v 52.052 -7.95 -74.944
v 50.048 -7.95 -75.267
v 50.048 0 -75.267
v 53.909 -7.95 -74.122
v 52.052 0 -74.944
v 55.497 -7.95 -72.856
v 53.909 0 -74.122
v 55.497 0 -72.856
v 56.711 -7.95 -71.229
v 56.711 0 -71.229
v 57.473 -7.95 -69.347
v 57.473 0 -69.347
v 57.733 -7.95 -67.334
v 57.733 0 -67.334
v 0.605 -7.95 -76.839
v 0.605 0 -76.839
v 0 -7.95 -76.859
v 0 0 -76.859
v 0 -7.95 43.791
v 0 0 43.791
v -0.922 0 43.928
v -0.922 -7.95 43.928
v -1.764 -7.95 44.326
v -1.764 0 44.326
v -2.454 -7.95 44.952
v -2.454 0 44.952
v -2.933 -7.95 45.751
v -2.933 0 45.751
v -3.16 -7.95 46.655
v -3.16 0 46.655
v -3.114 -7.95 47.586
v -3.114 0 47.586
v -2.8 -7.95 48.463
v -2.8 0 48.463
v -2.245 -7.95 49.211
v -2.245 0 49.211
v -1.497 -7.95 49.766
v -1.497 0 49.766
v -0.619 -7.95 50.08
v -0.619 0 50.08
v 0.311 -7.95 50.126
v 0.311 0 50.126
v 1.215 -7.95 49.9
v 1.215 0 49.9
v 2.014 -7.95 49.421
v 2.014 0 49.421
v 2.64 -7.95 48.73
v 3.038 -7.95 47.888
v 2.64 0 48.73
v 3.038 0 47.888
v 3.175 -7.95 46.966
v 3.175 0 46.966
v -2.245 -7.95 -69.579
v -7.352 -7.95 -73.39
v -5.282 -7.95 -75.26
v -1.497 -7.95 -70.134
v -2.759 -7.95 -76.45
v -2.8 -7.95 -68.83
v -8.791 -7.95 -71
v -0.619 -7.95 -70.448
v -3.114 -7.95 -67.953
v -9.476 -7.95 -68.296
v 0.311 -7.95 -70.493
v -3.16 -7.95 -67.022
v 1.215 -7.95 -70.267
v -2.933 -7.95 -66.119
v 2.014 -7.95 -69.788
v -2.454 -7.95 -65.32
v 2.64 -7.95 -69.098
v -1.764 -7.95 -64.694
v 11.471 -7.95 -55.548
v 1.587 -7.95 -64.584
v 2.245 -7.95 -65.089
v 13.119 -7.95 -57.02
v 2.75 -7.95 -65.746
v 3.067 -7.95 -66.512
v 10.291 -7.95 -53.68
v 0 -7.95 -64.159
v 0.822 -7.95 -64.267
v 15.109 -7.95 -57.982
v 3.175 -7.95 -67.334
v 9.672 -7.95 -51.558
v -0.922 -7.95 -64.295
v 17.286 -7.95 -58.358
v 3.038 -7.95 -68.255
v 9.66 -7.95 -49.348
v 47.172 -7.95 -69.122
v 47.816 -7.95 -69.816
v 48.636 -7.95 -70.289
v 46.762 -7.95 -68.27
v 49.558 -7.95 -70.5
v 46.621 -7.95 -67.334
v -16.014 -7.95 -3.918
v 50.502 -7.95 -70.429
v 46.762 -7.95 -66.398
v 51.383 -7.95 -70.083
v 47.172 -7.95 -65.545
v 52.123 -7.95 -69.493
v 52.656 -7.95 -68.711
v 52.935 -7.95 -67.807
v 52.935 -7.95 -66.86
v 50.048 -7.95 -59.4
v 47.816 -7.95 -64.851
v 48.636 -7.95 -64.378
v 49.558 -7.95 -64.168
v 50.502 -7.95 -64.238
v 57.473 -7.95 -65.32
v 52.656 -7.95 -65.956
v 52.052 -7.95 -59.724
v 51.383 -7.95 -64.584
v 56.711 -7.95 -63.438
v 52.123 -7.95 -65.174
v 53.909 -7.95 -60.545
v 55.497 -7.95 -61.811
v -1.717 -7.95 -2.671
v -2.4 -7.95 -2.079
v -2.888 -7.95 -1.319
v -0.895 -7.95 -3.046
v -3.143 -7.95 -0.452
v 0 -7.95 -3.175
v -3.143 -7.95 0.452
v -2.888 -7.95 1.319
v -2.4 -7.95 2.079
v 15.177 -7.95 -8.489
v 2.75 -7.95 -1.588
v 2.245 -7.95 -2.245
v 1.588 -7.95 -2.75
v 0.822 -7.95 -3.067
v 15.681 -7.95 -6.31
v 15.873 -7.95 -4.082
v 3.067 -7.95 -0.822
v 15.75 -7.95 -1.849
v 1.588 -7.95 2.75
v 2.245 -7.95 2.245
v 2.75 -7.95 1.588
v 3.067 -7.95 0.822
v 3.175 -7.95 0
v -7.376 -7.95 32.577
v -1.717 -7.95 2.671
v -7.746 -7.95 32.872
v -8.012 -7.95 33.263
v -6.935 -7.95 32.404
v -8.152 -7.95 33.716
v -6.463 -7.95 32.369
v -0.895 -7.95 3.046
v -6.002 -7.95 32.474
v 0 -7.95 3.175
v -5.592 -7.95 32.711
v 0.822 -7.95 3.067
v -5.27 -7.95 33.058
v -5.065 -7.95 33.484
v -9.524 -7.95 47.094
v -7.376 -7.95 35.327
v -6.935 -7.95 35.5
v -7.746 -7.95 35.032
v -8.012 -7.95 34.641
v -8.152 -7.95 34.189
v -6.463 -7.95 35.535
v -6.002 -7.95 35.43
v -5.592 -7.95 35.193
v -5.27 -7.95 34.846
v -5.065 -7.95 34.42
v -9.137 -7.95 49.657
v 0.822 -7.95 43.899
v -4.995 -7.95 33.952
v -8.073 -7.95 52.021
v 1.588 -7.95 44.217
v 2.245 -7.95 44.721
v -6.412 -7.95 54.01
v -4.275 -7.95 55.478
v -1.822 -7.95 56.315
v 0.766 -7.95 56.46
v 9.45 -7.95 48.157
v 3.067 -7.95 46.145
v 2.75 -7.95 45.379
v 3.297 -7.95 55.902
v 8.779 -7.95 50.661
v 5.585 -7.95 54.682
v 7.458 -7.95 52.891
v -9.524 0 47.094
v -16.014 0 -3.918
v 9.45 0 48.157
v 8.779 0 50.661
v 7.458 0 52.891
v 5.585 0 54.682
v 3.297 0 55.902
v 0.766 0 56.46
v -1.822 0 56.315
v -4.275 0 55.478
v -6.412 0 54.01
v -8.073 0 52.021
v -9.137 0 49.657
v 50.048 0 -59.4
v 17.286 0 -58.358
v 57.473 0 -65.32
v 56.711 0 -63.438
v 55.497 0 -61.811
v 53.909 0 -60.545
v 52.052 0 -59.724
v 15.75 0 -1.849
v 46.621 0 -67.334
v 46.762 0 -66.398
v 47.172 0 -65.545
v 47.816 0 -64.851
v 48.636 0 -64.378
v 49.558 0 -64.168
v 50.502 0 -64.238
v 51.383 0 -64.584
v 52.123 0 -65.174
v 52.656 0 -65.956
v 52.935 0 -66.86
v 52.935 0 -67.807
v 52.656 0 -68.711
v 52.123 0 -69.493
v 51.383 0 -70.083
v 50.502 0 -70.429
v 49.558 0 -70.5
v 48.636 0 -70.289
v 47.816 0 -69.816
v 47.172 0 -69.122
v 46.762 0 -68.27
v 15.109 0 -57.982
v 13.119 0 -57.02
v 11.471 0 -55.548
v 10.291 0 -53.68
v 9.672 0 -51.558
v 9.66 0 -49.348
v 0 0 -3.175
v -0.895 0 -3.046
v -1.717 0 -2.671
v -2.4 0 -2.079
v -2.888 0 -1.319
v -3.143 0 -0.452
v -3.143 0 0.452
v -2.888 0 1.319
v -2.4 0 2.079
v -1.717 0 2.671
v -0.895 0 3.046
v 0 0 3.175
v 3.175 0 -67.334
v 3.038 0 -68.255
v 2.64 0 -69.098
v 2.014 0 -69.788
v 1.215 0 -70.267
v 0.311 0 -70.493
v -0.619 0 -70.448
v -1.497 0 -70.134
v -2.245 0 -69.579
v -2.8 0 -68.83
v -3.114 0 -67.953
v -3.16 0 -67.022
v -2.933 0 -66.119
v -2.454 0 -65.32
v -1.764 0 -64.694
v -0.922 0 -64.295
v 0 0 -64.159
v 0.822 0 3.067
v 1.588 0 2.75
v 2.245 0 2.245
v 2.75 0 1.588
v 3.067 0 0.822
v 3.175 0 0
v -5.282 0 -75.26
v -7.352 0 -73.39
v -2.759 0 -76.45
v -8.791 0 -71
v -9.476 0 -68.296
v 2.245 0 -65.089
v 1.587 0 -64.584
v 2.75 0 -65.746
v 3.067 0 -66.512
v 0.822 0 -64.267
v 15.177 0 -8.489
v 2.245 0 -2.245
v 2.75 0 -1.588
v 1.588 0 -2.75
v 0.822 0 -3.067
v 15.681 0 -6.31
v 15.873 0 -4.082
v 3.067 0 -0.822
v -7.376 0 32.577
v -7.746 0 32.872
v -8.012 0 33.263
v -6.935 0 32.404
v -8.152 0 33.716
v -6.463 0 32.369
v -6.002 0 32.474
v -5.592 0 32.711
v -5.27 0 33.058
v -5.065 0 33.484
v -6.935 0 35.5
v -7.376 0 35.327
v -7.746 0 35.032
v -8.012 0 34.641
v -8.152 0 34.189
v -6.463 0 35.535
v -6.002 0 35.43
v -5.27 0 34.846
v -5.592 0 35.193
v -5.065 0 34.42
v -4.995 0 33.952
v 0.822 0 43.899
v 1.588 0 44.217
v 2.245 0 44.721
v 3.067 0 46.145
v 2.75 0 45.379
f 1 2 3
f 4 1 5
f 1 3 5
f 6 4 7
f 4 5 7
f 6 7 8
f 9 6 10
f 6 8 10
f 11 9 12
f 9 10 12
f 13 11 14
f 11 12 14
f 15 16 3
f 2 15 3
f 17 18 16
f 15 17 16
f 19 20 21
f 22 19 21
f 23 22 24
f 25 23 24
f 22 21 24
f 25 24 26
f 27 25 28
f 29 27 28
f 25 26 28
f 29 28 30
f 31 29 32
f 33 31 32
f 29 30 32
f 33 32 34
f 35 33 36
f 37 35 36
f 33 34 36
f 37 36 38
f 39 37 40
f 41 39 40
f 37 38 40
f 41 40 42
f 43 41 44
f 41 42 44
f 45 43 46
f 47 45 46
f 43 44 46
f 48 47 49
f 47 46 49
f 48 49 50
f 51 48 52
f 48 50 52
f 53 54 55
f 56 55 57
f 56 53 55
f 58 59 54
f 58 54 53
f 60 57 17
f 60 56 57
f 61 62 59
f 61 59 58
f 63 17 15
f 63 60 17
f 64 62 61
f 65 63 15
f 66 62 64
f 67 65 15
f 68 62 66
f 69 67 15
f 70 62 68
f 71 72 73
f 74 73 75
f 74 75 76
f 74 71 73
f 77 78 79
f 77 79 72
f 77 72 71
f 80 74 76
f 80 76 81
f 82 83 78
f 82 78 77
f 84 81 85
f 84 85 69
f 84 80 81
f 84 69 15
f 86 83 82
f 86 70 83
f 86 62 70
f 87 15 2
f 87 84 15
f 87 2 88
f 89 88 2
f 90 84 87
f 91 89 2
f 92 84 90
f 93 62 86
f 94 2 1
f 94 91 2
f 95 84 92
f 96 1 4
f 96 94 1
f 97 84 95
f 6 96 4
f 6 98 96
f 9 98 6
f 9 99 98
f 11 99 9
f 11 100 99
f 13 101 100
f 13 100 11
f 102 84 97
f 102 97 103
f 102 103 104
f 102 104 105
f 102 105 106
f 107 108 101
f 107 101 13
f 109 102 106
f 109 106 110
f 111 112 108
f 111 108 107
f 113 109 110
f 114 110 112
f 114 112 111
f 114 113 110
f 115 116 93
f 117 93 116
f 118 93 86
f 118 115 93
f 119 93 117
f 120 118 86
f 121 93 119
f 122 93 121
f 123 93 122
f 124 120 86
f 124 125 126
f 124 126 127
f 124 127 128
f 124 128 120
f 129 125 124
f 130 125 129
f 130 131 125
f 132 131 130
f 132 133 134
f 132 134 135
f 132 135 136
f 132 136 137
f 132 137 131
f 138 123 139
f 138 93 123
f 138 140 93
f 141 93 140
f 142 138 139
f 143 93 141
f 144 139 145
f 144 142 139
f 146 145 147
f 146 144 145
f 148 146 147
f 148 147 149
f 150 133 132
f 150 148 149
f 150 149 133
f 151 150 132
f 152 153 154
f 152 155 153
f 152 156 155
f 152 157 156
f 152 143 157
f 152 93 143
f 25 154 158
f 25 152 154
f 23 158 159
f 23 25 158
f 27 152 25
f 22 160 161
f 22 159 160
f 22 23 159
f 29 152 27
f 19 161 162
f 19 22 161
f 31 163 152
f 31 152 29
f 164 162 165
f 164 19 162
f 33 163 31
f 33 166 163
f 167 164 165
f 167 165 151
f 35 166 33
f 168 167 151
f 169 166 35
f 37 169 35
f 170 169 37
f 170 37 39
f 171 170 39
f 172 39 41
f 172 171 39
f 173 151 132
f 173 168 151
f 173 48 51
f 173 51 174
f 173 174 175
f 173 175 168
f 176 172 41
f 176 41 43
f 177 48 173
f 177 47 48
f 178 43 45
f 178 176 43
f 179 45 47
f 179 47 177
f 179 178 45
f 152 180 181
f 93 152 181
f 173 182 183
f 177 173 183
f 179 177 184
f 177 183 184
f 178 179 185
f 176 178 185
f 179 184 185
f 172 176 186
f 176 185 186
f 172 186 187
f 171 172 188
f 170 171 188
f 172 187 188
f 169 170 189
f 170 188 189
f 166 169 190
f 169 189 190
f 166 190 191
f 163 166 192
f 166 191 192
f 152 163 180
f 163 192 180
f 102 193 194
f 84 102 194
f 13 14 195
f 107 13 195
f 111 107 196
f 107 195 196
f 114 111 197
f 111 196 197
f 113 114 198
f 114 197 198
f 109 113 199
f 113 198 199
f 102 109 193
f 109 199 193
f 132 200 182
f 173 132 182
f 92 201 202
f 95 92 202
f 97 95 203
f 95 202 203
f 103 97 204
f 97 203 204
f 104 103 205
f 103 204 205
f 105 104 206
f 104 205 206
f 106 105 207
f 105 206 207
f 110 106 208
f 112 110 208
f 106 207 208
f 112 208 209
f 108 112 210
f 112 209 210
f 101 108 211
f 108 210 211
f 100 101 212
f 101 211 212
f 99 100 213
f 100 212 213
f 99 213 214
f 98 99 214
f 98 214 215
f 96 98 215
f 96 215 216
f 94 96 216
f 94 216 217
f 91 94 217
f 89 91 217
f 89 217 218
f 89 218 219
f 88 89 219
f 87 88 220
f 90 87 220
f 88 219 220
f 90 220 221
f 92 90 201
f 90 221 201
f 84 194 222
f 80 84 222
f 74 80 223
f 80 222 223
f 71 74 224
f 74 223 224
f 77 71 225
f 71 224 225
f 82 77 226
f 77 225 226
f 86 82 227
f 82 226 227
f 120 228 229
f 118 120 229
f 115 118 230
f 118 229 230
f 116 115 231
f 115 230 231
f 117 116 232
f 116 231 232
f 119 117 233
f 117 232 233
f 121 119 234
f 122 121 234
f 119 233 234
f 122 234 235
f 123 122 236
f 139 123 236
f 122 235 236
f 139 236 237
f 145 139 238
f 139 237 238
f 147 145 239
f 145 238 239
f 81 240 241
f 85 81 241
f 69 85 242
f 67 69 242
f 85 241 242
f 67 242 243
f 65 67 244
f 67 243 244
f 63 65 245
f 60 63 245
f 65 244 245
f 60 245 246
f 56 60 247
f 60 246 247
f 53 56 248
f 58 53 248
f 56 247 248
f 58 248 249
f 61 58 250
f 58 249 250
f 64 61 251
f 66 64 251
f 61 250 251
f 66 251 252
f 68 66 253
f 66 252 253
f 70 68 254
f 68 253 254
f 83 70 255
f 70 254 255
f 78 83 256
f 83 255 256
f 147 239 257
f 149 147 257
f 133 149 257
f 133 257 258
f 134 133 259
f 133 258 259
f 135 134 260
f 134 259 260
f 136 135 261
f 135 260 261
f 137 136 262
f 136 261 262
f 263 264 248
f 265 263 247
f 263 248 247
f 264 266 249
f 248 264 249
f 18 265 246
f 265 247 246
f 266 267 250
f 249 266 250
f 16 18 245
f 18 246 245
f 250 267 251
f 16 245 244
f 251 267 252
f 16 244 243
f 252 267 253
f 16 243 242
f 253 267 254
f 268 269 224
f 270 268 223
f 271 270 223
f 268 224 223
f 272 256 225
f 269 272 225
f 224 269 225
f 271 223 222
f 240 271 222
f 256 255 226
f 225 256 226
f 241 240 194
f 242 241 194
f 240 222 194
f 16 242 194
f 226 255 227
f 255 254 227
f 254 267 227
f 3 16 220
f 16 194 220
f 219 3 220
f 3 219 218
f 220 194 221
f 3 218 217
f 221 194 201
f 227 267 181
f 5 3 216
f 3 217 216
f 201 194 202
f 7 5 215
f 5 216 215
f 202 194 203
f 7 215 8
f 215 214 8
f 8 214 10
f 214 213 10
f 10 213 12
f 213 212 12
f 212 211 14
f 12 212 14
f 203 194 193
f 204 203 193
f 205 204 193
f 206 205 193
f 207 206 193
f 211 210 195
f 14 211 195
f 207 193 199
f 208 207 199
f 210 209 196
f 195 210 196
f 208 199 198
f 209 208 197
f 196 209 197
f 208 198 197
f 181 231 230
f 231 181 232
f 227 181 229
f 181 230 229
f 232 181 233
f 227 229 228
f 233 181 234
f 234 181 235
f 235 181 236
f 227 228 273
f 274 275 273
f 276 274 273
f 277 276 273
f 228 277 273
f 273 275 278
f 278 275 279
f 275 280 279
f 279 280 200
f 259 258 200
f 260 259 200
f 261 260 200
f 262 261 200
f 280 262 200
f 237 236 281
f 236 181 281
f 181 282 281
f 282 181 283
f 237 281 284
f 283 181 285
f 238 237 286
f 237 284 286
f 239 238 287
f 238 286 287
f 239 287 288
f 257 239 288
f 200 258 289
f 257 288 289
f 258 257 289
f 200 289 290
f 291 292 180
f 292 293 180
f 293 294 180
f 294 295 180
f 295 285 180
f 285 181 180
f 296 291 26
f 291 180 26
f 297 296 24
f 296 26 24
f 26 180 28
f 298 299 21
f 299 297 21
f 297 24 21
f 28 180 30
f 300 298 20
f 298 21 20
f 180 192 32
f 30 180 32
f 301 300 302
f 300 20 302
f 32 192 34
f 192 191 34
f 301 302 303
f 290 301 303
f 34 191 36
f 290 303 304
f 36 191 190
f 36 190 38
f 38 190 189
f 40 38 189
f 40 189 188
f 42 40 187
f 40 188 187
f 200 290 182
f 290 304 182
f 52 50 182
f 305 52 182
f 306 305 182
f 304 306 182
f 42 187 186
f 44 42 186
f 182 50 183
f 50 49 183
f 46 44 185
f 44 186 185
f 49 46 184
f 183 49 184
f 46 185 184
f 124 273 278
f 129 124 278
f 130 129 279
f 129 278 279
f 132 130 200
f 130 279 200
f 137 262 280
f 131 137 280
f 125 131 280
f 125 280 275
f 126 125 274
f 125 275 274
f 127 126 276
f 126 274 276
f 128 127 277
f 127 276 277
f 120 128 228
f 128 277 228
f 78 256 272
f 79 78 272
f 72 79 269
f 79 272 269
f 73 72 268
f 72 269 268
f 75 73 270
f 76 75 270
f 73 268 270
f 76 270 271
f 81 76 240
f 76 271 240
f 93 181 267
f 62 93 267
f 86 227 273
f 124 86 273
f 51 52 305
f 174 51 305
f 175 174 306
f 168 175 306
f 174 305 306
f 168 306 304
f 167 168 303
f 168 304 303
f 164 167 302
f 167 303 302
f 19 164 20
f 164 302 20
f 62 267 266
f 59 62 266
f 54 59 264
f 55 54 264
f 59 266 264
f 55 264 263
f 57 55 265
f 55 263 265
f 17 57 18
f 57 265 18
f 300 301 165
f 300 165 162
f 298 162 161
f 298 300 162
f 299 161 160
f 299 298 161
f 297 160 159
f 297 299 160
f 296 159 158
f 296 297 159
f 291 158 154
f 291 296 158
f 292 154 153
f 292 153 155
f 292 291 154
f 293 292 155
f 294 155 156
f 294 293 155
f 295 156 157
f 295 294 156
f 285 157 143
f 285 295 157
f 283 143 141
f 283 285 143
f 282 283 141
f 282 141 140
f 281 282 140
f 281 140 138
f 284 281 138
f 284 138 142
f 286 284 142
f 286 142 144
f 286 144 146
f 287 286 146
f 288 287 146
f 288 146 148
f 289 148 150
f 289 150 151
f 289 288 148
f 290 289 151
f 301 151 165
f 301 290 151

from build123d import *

# Parameters (mm, degrees)
F0_R     = 1.5875
F1_DEPTH = 7.9502


with BuildPart() as f1:
    # F0 (on Front) → F1 (new body)
    with BuildSketch(Plane.XZ):
        with BuildLine():
            Line((0, 12.0413007322), (0, 37.4413007322))
            ThreePointArc((0, 37.4413007322), (-6.7801009863, 40.2763189971), (-9.5241473512, 47.0937457472))
            Line((-9.5241473512, 47.0937457472), (-15.7480782934, -1.8302884103))
            ThreePointArc((-15.7480782934, -1.8302884103), (-10.4931281713, 8.0788943281), (0, 12.0413007322))
        make_face()
        with Locations((-6.5820463933, 33.9521430433)):
            Circle(F0_R, mode=Mode.SUBTRACT)
        with BuildLine():
            ThreePointArc((9.525, 46.9663007322), (6.7351920908, 40.2311086414), (0, 37.4413007322))
            Line((0, 37.4413007322), (0, 12.0413007322))
            ThreePointArc((0, 12.0413007322), (10.5003255158, 8.0725507322), (15.7504882737, -1.8493242678))
            Line((15.7504882737, -1.8493242678), (9.4502929642, 48.1569257322))
            ThreePointArc((9.4502929642, 48.1569257322), (9.5063048942, 47.5627839741), (9.525, 46.9663007322))
        make_face()
        with BuildLine():
            ThreePointArc((-9.5241473512, 47.0937457472), (-6.7801009863, 40.2763189971), (0, 37.4413007322))
            ThreePointArc((0, 37.4413007322), (6.7351920908, 40.2311086414), (9.525, 46.9663007322))
            ThreePointArc((9.525, 46.9663007322), (9.5063048942, 47.5627839741), (9.4502929642, 48.1569257322))
            ThreePointArc((9.4502929642, 48.1569257322), (-0.5328710329, 56.4763834585), (-9.5241473512, 47.0937457472))
        make_face()
        with BuildLine():
            ThreePointArc((3.175, 46.9663007322), (2.2450640303, 44.7212367019), (0, 43.7913007322))
            ThreePointArc((0, 43.7913007322), (-2.2450640303, 49.2113647624), (3.175, 46.9663007322))
        make_face(mode=Mode.SUBTRACT)
        with BuildLine():
            ThreePointArc((15.7504882737, -1.8493242678), (10.5003255158, 8.0725507322), (0, 12.0413007322))
            Line((0, 12.0413007322), (0, 3.175))
            ThreePointArc((0, 3.175), (2.2450640303, 2.2450640303), (3.175, 0))
            ThreePointArc((3.175, 0), (2.2450640303, -2.2450640303), (0, -3.175))
            Line((0, -3.175), (0, -19.7086992678))
            ThreePointArc((0, -19.7086992678), (9.4368838065, -16.5993112399), (15.1770200819, -8.4891999321))
            ThreePointArc((15.1770200819, -8.4891999321), (15.6995353243, -6.1874655265), (15.875, -3.8336992678))
            ThreePointArc((15.875, -3.8336992678), (15.8438414904, -2.8395605312), (15.7504882737, -1.8493242678))
        make_face()
        with BuildLine():
            Line((0, 3.175), (0, 12.0413007322))
            ThreePointArc((0, 12.0413007322), (-10.4931281713, 8.0788943281), (-15.7480782934, -1.8302884103))
            ThreePointArc((-15.7480782934, -1.8302884103), (-11.9125935959, -14.3268274391), (0, -19.7086992678))
            Line((0, -19.7086992678), (0, -3.175))
            ThreePointArc((0, -3.175), (-3.175, 0), (0, 3.175))
        make_face()
        with BuildLine():
            ThreePointArc((0, -19.7086992678), (-11.9125935959, -14.3268274391), (-15.7480782934, -1.8302884103))
            Line((-15.7480782934, -1.8302884103), (-16.0137054558, -3.9182859294))
            Line((-16.0137054558, -3.9182859294), (-9.4762655267, -68.2959968664))
            ThreePointArc((-9.4762655267, -68.2959968664), (-7.067231057, -60.9477874154), (0, -57.8086992678))
            Line((0, -57.8086992678), (0, -19.7086992678))
        make_face()
        with BuildLine():
            ThreePointArc((15.1770200819, -8.4891999321), (9.4368838065, -16.5993112399), (0, -19.7086992678))
            Line((0, -19.7086992678), (0, -57.8086992678))
            ThreePointArc((0, -57.8086992678), (6.7351920908, -60.598507177), (9.525, -67.3336992678))
            Line((9.525, -67.3336992678), (41.8581225716, -67.3336992678))
            ThreePointArc((41.8581225716, -67.3336992678), (44.2728781992, -61.6325414164), (50.0479054623, -59.4002095191))
            Line((50.0479054623, -59.4002095191), (17.2861640166, -58.3583947443))
            ThreePointArc((17.2861640166, -58.3583947443), (11.470504938, -55.5484416885), (9.6601438639, -49.3484159244))
            Line((9.6601438639, -49.3484159244), (15.1770200819, -8.4891999321))
        make_face()
        with BuildLine():
            Line((41.8581225716, -67.3336992678), (9.525, -67.3336992678))
            ThreePointArc((9.525, -67.3336992678), (6.9458584111, -73.8514194163), (0.6051730325, -76.8394549243))
            Line((0.6051730325, -76.8394549243), (50.0479054623, -75.2671890166))
            ThreePointArc((50.0479054623, -75.2671890166), (44.2728781992, -73.0348571193), (41.8581225716, -67.3336992678))
        make_face()
        with BuildLine():
            Line((0, -64.1586992678), (0, -57.8086992678))
            ThreePointArc((0, -57.8086992678), (-7.067231057, -60.9477874154), (-9.4762655267, -68.2959968664))
            ThreePointArc((-9.4762655267, -68.2959968664), (-6.3859118524, -74.4009303248), (0, -76.8586992678))
            Line((0, -76.8586992678), (0.6051730325, -76.8394549243))
            ThreePointArc((0.6051730325, -76.8394549243), (6.9458584111, -73.8514194163), (9.525, -67.3336992678))
            Line((9.525, -67.3336992678), (3.175, -67.3336992678))
            ThreePointArc((3.175, -67.3336992678), (-2.2450640303, -69.5787632981), (0, -64.1586992678))
        make_face()
        with BuildLine():
            ThreePointArc((9.525, -67.3336992678), (6.7351920908, -60.598507177), (0, -57.8086992678))
            Line((0, -57.8086992678), (0, -64.1586992678))
            ThreePointArc((0, -64.1586992678), (2.2450640303, -65.0886352376), (3.175, -67.3336992678))
            Line((3.175, -67.3336992678), (9.525, -67.3336992678))
        make_face()
        with BuildLine():
            ThreePointArc((50.0479054623, -59.4002095191), (44.2728781992, -61.6325414164), (41.8581225716, -67.3336992678))
            ThreePointArc((41.8581225716, -67.3336992678), (44.2728781992, -73.0348571193), (50.0479054623, -75.2671890166))
            ThreePointArc((50.0479054623, -75.2671890166), (55.4967804231, -72.8564436402), (57.7331225716, -67.3336992678))
            ThreePointArc((57.7331225716, -67.3336992678), (55.4967804231, -61.8109548955), (50.0479054623, -59.4002095191))
        make_face()
        with BuildLine():
            ThreePointArc((52.9706225716, -67.3336992678), (49.7956225716, -70.5086992678), (46.6206225716, -67.3336992678))
            ThreePointArc((46.6206225716, -67.3336992678), (49.7956225716, -64.1586992678), (52.9706225716, -67.3336992678))
        make_face(mode=Mode.SUBTRACT)
    extrude(amount=F1_DEPTH)


solid = f1.part
